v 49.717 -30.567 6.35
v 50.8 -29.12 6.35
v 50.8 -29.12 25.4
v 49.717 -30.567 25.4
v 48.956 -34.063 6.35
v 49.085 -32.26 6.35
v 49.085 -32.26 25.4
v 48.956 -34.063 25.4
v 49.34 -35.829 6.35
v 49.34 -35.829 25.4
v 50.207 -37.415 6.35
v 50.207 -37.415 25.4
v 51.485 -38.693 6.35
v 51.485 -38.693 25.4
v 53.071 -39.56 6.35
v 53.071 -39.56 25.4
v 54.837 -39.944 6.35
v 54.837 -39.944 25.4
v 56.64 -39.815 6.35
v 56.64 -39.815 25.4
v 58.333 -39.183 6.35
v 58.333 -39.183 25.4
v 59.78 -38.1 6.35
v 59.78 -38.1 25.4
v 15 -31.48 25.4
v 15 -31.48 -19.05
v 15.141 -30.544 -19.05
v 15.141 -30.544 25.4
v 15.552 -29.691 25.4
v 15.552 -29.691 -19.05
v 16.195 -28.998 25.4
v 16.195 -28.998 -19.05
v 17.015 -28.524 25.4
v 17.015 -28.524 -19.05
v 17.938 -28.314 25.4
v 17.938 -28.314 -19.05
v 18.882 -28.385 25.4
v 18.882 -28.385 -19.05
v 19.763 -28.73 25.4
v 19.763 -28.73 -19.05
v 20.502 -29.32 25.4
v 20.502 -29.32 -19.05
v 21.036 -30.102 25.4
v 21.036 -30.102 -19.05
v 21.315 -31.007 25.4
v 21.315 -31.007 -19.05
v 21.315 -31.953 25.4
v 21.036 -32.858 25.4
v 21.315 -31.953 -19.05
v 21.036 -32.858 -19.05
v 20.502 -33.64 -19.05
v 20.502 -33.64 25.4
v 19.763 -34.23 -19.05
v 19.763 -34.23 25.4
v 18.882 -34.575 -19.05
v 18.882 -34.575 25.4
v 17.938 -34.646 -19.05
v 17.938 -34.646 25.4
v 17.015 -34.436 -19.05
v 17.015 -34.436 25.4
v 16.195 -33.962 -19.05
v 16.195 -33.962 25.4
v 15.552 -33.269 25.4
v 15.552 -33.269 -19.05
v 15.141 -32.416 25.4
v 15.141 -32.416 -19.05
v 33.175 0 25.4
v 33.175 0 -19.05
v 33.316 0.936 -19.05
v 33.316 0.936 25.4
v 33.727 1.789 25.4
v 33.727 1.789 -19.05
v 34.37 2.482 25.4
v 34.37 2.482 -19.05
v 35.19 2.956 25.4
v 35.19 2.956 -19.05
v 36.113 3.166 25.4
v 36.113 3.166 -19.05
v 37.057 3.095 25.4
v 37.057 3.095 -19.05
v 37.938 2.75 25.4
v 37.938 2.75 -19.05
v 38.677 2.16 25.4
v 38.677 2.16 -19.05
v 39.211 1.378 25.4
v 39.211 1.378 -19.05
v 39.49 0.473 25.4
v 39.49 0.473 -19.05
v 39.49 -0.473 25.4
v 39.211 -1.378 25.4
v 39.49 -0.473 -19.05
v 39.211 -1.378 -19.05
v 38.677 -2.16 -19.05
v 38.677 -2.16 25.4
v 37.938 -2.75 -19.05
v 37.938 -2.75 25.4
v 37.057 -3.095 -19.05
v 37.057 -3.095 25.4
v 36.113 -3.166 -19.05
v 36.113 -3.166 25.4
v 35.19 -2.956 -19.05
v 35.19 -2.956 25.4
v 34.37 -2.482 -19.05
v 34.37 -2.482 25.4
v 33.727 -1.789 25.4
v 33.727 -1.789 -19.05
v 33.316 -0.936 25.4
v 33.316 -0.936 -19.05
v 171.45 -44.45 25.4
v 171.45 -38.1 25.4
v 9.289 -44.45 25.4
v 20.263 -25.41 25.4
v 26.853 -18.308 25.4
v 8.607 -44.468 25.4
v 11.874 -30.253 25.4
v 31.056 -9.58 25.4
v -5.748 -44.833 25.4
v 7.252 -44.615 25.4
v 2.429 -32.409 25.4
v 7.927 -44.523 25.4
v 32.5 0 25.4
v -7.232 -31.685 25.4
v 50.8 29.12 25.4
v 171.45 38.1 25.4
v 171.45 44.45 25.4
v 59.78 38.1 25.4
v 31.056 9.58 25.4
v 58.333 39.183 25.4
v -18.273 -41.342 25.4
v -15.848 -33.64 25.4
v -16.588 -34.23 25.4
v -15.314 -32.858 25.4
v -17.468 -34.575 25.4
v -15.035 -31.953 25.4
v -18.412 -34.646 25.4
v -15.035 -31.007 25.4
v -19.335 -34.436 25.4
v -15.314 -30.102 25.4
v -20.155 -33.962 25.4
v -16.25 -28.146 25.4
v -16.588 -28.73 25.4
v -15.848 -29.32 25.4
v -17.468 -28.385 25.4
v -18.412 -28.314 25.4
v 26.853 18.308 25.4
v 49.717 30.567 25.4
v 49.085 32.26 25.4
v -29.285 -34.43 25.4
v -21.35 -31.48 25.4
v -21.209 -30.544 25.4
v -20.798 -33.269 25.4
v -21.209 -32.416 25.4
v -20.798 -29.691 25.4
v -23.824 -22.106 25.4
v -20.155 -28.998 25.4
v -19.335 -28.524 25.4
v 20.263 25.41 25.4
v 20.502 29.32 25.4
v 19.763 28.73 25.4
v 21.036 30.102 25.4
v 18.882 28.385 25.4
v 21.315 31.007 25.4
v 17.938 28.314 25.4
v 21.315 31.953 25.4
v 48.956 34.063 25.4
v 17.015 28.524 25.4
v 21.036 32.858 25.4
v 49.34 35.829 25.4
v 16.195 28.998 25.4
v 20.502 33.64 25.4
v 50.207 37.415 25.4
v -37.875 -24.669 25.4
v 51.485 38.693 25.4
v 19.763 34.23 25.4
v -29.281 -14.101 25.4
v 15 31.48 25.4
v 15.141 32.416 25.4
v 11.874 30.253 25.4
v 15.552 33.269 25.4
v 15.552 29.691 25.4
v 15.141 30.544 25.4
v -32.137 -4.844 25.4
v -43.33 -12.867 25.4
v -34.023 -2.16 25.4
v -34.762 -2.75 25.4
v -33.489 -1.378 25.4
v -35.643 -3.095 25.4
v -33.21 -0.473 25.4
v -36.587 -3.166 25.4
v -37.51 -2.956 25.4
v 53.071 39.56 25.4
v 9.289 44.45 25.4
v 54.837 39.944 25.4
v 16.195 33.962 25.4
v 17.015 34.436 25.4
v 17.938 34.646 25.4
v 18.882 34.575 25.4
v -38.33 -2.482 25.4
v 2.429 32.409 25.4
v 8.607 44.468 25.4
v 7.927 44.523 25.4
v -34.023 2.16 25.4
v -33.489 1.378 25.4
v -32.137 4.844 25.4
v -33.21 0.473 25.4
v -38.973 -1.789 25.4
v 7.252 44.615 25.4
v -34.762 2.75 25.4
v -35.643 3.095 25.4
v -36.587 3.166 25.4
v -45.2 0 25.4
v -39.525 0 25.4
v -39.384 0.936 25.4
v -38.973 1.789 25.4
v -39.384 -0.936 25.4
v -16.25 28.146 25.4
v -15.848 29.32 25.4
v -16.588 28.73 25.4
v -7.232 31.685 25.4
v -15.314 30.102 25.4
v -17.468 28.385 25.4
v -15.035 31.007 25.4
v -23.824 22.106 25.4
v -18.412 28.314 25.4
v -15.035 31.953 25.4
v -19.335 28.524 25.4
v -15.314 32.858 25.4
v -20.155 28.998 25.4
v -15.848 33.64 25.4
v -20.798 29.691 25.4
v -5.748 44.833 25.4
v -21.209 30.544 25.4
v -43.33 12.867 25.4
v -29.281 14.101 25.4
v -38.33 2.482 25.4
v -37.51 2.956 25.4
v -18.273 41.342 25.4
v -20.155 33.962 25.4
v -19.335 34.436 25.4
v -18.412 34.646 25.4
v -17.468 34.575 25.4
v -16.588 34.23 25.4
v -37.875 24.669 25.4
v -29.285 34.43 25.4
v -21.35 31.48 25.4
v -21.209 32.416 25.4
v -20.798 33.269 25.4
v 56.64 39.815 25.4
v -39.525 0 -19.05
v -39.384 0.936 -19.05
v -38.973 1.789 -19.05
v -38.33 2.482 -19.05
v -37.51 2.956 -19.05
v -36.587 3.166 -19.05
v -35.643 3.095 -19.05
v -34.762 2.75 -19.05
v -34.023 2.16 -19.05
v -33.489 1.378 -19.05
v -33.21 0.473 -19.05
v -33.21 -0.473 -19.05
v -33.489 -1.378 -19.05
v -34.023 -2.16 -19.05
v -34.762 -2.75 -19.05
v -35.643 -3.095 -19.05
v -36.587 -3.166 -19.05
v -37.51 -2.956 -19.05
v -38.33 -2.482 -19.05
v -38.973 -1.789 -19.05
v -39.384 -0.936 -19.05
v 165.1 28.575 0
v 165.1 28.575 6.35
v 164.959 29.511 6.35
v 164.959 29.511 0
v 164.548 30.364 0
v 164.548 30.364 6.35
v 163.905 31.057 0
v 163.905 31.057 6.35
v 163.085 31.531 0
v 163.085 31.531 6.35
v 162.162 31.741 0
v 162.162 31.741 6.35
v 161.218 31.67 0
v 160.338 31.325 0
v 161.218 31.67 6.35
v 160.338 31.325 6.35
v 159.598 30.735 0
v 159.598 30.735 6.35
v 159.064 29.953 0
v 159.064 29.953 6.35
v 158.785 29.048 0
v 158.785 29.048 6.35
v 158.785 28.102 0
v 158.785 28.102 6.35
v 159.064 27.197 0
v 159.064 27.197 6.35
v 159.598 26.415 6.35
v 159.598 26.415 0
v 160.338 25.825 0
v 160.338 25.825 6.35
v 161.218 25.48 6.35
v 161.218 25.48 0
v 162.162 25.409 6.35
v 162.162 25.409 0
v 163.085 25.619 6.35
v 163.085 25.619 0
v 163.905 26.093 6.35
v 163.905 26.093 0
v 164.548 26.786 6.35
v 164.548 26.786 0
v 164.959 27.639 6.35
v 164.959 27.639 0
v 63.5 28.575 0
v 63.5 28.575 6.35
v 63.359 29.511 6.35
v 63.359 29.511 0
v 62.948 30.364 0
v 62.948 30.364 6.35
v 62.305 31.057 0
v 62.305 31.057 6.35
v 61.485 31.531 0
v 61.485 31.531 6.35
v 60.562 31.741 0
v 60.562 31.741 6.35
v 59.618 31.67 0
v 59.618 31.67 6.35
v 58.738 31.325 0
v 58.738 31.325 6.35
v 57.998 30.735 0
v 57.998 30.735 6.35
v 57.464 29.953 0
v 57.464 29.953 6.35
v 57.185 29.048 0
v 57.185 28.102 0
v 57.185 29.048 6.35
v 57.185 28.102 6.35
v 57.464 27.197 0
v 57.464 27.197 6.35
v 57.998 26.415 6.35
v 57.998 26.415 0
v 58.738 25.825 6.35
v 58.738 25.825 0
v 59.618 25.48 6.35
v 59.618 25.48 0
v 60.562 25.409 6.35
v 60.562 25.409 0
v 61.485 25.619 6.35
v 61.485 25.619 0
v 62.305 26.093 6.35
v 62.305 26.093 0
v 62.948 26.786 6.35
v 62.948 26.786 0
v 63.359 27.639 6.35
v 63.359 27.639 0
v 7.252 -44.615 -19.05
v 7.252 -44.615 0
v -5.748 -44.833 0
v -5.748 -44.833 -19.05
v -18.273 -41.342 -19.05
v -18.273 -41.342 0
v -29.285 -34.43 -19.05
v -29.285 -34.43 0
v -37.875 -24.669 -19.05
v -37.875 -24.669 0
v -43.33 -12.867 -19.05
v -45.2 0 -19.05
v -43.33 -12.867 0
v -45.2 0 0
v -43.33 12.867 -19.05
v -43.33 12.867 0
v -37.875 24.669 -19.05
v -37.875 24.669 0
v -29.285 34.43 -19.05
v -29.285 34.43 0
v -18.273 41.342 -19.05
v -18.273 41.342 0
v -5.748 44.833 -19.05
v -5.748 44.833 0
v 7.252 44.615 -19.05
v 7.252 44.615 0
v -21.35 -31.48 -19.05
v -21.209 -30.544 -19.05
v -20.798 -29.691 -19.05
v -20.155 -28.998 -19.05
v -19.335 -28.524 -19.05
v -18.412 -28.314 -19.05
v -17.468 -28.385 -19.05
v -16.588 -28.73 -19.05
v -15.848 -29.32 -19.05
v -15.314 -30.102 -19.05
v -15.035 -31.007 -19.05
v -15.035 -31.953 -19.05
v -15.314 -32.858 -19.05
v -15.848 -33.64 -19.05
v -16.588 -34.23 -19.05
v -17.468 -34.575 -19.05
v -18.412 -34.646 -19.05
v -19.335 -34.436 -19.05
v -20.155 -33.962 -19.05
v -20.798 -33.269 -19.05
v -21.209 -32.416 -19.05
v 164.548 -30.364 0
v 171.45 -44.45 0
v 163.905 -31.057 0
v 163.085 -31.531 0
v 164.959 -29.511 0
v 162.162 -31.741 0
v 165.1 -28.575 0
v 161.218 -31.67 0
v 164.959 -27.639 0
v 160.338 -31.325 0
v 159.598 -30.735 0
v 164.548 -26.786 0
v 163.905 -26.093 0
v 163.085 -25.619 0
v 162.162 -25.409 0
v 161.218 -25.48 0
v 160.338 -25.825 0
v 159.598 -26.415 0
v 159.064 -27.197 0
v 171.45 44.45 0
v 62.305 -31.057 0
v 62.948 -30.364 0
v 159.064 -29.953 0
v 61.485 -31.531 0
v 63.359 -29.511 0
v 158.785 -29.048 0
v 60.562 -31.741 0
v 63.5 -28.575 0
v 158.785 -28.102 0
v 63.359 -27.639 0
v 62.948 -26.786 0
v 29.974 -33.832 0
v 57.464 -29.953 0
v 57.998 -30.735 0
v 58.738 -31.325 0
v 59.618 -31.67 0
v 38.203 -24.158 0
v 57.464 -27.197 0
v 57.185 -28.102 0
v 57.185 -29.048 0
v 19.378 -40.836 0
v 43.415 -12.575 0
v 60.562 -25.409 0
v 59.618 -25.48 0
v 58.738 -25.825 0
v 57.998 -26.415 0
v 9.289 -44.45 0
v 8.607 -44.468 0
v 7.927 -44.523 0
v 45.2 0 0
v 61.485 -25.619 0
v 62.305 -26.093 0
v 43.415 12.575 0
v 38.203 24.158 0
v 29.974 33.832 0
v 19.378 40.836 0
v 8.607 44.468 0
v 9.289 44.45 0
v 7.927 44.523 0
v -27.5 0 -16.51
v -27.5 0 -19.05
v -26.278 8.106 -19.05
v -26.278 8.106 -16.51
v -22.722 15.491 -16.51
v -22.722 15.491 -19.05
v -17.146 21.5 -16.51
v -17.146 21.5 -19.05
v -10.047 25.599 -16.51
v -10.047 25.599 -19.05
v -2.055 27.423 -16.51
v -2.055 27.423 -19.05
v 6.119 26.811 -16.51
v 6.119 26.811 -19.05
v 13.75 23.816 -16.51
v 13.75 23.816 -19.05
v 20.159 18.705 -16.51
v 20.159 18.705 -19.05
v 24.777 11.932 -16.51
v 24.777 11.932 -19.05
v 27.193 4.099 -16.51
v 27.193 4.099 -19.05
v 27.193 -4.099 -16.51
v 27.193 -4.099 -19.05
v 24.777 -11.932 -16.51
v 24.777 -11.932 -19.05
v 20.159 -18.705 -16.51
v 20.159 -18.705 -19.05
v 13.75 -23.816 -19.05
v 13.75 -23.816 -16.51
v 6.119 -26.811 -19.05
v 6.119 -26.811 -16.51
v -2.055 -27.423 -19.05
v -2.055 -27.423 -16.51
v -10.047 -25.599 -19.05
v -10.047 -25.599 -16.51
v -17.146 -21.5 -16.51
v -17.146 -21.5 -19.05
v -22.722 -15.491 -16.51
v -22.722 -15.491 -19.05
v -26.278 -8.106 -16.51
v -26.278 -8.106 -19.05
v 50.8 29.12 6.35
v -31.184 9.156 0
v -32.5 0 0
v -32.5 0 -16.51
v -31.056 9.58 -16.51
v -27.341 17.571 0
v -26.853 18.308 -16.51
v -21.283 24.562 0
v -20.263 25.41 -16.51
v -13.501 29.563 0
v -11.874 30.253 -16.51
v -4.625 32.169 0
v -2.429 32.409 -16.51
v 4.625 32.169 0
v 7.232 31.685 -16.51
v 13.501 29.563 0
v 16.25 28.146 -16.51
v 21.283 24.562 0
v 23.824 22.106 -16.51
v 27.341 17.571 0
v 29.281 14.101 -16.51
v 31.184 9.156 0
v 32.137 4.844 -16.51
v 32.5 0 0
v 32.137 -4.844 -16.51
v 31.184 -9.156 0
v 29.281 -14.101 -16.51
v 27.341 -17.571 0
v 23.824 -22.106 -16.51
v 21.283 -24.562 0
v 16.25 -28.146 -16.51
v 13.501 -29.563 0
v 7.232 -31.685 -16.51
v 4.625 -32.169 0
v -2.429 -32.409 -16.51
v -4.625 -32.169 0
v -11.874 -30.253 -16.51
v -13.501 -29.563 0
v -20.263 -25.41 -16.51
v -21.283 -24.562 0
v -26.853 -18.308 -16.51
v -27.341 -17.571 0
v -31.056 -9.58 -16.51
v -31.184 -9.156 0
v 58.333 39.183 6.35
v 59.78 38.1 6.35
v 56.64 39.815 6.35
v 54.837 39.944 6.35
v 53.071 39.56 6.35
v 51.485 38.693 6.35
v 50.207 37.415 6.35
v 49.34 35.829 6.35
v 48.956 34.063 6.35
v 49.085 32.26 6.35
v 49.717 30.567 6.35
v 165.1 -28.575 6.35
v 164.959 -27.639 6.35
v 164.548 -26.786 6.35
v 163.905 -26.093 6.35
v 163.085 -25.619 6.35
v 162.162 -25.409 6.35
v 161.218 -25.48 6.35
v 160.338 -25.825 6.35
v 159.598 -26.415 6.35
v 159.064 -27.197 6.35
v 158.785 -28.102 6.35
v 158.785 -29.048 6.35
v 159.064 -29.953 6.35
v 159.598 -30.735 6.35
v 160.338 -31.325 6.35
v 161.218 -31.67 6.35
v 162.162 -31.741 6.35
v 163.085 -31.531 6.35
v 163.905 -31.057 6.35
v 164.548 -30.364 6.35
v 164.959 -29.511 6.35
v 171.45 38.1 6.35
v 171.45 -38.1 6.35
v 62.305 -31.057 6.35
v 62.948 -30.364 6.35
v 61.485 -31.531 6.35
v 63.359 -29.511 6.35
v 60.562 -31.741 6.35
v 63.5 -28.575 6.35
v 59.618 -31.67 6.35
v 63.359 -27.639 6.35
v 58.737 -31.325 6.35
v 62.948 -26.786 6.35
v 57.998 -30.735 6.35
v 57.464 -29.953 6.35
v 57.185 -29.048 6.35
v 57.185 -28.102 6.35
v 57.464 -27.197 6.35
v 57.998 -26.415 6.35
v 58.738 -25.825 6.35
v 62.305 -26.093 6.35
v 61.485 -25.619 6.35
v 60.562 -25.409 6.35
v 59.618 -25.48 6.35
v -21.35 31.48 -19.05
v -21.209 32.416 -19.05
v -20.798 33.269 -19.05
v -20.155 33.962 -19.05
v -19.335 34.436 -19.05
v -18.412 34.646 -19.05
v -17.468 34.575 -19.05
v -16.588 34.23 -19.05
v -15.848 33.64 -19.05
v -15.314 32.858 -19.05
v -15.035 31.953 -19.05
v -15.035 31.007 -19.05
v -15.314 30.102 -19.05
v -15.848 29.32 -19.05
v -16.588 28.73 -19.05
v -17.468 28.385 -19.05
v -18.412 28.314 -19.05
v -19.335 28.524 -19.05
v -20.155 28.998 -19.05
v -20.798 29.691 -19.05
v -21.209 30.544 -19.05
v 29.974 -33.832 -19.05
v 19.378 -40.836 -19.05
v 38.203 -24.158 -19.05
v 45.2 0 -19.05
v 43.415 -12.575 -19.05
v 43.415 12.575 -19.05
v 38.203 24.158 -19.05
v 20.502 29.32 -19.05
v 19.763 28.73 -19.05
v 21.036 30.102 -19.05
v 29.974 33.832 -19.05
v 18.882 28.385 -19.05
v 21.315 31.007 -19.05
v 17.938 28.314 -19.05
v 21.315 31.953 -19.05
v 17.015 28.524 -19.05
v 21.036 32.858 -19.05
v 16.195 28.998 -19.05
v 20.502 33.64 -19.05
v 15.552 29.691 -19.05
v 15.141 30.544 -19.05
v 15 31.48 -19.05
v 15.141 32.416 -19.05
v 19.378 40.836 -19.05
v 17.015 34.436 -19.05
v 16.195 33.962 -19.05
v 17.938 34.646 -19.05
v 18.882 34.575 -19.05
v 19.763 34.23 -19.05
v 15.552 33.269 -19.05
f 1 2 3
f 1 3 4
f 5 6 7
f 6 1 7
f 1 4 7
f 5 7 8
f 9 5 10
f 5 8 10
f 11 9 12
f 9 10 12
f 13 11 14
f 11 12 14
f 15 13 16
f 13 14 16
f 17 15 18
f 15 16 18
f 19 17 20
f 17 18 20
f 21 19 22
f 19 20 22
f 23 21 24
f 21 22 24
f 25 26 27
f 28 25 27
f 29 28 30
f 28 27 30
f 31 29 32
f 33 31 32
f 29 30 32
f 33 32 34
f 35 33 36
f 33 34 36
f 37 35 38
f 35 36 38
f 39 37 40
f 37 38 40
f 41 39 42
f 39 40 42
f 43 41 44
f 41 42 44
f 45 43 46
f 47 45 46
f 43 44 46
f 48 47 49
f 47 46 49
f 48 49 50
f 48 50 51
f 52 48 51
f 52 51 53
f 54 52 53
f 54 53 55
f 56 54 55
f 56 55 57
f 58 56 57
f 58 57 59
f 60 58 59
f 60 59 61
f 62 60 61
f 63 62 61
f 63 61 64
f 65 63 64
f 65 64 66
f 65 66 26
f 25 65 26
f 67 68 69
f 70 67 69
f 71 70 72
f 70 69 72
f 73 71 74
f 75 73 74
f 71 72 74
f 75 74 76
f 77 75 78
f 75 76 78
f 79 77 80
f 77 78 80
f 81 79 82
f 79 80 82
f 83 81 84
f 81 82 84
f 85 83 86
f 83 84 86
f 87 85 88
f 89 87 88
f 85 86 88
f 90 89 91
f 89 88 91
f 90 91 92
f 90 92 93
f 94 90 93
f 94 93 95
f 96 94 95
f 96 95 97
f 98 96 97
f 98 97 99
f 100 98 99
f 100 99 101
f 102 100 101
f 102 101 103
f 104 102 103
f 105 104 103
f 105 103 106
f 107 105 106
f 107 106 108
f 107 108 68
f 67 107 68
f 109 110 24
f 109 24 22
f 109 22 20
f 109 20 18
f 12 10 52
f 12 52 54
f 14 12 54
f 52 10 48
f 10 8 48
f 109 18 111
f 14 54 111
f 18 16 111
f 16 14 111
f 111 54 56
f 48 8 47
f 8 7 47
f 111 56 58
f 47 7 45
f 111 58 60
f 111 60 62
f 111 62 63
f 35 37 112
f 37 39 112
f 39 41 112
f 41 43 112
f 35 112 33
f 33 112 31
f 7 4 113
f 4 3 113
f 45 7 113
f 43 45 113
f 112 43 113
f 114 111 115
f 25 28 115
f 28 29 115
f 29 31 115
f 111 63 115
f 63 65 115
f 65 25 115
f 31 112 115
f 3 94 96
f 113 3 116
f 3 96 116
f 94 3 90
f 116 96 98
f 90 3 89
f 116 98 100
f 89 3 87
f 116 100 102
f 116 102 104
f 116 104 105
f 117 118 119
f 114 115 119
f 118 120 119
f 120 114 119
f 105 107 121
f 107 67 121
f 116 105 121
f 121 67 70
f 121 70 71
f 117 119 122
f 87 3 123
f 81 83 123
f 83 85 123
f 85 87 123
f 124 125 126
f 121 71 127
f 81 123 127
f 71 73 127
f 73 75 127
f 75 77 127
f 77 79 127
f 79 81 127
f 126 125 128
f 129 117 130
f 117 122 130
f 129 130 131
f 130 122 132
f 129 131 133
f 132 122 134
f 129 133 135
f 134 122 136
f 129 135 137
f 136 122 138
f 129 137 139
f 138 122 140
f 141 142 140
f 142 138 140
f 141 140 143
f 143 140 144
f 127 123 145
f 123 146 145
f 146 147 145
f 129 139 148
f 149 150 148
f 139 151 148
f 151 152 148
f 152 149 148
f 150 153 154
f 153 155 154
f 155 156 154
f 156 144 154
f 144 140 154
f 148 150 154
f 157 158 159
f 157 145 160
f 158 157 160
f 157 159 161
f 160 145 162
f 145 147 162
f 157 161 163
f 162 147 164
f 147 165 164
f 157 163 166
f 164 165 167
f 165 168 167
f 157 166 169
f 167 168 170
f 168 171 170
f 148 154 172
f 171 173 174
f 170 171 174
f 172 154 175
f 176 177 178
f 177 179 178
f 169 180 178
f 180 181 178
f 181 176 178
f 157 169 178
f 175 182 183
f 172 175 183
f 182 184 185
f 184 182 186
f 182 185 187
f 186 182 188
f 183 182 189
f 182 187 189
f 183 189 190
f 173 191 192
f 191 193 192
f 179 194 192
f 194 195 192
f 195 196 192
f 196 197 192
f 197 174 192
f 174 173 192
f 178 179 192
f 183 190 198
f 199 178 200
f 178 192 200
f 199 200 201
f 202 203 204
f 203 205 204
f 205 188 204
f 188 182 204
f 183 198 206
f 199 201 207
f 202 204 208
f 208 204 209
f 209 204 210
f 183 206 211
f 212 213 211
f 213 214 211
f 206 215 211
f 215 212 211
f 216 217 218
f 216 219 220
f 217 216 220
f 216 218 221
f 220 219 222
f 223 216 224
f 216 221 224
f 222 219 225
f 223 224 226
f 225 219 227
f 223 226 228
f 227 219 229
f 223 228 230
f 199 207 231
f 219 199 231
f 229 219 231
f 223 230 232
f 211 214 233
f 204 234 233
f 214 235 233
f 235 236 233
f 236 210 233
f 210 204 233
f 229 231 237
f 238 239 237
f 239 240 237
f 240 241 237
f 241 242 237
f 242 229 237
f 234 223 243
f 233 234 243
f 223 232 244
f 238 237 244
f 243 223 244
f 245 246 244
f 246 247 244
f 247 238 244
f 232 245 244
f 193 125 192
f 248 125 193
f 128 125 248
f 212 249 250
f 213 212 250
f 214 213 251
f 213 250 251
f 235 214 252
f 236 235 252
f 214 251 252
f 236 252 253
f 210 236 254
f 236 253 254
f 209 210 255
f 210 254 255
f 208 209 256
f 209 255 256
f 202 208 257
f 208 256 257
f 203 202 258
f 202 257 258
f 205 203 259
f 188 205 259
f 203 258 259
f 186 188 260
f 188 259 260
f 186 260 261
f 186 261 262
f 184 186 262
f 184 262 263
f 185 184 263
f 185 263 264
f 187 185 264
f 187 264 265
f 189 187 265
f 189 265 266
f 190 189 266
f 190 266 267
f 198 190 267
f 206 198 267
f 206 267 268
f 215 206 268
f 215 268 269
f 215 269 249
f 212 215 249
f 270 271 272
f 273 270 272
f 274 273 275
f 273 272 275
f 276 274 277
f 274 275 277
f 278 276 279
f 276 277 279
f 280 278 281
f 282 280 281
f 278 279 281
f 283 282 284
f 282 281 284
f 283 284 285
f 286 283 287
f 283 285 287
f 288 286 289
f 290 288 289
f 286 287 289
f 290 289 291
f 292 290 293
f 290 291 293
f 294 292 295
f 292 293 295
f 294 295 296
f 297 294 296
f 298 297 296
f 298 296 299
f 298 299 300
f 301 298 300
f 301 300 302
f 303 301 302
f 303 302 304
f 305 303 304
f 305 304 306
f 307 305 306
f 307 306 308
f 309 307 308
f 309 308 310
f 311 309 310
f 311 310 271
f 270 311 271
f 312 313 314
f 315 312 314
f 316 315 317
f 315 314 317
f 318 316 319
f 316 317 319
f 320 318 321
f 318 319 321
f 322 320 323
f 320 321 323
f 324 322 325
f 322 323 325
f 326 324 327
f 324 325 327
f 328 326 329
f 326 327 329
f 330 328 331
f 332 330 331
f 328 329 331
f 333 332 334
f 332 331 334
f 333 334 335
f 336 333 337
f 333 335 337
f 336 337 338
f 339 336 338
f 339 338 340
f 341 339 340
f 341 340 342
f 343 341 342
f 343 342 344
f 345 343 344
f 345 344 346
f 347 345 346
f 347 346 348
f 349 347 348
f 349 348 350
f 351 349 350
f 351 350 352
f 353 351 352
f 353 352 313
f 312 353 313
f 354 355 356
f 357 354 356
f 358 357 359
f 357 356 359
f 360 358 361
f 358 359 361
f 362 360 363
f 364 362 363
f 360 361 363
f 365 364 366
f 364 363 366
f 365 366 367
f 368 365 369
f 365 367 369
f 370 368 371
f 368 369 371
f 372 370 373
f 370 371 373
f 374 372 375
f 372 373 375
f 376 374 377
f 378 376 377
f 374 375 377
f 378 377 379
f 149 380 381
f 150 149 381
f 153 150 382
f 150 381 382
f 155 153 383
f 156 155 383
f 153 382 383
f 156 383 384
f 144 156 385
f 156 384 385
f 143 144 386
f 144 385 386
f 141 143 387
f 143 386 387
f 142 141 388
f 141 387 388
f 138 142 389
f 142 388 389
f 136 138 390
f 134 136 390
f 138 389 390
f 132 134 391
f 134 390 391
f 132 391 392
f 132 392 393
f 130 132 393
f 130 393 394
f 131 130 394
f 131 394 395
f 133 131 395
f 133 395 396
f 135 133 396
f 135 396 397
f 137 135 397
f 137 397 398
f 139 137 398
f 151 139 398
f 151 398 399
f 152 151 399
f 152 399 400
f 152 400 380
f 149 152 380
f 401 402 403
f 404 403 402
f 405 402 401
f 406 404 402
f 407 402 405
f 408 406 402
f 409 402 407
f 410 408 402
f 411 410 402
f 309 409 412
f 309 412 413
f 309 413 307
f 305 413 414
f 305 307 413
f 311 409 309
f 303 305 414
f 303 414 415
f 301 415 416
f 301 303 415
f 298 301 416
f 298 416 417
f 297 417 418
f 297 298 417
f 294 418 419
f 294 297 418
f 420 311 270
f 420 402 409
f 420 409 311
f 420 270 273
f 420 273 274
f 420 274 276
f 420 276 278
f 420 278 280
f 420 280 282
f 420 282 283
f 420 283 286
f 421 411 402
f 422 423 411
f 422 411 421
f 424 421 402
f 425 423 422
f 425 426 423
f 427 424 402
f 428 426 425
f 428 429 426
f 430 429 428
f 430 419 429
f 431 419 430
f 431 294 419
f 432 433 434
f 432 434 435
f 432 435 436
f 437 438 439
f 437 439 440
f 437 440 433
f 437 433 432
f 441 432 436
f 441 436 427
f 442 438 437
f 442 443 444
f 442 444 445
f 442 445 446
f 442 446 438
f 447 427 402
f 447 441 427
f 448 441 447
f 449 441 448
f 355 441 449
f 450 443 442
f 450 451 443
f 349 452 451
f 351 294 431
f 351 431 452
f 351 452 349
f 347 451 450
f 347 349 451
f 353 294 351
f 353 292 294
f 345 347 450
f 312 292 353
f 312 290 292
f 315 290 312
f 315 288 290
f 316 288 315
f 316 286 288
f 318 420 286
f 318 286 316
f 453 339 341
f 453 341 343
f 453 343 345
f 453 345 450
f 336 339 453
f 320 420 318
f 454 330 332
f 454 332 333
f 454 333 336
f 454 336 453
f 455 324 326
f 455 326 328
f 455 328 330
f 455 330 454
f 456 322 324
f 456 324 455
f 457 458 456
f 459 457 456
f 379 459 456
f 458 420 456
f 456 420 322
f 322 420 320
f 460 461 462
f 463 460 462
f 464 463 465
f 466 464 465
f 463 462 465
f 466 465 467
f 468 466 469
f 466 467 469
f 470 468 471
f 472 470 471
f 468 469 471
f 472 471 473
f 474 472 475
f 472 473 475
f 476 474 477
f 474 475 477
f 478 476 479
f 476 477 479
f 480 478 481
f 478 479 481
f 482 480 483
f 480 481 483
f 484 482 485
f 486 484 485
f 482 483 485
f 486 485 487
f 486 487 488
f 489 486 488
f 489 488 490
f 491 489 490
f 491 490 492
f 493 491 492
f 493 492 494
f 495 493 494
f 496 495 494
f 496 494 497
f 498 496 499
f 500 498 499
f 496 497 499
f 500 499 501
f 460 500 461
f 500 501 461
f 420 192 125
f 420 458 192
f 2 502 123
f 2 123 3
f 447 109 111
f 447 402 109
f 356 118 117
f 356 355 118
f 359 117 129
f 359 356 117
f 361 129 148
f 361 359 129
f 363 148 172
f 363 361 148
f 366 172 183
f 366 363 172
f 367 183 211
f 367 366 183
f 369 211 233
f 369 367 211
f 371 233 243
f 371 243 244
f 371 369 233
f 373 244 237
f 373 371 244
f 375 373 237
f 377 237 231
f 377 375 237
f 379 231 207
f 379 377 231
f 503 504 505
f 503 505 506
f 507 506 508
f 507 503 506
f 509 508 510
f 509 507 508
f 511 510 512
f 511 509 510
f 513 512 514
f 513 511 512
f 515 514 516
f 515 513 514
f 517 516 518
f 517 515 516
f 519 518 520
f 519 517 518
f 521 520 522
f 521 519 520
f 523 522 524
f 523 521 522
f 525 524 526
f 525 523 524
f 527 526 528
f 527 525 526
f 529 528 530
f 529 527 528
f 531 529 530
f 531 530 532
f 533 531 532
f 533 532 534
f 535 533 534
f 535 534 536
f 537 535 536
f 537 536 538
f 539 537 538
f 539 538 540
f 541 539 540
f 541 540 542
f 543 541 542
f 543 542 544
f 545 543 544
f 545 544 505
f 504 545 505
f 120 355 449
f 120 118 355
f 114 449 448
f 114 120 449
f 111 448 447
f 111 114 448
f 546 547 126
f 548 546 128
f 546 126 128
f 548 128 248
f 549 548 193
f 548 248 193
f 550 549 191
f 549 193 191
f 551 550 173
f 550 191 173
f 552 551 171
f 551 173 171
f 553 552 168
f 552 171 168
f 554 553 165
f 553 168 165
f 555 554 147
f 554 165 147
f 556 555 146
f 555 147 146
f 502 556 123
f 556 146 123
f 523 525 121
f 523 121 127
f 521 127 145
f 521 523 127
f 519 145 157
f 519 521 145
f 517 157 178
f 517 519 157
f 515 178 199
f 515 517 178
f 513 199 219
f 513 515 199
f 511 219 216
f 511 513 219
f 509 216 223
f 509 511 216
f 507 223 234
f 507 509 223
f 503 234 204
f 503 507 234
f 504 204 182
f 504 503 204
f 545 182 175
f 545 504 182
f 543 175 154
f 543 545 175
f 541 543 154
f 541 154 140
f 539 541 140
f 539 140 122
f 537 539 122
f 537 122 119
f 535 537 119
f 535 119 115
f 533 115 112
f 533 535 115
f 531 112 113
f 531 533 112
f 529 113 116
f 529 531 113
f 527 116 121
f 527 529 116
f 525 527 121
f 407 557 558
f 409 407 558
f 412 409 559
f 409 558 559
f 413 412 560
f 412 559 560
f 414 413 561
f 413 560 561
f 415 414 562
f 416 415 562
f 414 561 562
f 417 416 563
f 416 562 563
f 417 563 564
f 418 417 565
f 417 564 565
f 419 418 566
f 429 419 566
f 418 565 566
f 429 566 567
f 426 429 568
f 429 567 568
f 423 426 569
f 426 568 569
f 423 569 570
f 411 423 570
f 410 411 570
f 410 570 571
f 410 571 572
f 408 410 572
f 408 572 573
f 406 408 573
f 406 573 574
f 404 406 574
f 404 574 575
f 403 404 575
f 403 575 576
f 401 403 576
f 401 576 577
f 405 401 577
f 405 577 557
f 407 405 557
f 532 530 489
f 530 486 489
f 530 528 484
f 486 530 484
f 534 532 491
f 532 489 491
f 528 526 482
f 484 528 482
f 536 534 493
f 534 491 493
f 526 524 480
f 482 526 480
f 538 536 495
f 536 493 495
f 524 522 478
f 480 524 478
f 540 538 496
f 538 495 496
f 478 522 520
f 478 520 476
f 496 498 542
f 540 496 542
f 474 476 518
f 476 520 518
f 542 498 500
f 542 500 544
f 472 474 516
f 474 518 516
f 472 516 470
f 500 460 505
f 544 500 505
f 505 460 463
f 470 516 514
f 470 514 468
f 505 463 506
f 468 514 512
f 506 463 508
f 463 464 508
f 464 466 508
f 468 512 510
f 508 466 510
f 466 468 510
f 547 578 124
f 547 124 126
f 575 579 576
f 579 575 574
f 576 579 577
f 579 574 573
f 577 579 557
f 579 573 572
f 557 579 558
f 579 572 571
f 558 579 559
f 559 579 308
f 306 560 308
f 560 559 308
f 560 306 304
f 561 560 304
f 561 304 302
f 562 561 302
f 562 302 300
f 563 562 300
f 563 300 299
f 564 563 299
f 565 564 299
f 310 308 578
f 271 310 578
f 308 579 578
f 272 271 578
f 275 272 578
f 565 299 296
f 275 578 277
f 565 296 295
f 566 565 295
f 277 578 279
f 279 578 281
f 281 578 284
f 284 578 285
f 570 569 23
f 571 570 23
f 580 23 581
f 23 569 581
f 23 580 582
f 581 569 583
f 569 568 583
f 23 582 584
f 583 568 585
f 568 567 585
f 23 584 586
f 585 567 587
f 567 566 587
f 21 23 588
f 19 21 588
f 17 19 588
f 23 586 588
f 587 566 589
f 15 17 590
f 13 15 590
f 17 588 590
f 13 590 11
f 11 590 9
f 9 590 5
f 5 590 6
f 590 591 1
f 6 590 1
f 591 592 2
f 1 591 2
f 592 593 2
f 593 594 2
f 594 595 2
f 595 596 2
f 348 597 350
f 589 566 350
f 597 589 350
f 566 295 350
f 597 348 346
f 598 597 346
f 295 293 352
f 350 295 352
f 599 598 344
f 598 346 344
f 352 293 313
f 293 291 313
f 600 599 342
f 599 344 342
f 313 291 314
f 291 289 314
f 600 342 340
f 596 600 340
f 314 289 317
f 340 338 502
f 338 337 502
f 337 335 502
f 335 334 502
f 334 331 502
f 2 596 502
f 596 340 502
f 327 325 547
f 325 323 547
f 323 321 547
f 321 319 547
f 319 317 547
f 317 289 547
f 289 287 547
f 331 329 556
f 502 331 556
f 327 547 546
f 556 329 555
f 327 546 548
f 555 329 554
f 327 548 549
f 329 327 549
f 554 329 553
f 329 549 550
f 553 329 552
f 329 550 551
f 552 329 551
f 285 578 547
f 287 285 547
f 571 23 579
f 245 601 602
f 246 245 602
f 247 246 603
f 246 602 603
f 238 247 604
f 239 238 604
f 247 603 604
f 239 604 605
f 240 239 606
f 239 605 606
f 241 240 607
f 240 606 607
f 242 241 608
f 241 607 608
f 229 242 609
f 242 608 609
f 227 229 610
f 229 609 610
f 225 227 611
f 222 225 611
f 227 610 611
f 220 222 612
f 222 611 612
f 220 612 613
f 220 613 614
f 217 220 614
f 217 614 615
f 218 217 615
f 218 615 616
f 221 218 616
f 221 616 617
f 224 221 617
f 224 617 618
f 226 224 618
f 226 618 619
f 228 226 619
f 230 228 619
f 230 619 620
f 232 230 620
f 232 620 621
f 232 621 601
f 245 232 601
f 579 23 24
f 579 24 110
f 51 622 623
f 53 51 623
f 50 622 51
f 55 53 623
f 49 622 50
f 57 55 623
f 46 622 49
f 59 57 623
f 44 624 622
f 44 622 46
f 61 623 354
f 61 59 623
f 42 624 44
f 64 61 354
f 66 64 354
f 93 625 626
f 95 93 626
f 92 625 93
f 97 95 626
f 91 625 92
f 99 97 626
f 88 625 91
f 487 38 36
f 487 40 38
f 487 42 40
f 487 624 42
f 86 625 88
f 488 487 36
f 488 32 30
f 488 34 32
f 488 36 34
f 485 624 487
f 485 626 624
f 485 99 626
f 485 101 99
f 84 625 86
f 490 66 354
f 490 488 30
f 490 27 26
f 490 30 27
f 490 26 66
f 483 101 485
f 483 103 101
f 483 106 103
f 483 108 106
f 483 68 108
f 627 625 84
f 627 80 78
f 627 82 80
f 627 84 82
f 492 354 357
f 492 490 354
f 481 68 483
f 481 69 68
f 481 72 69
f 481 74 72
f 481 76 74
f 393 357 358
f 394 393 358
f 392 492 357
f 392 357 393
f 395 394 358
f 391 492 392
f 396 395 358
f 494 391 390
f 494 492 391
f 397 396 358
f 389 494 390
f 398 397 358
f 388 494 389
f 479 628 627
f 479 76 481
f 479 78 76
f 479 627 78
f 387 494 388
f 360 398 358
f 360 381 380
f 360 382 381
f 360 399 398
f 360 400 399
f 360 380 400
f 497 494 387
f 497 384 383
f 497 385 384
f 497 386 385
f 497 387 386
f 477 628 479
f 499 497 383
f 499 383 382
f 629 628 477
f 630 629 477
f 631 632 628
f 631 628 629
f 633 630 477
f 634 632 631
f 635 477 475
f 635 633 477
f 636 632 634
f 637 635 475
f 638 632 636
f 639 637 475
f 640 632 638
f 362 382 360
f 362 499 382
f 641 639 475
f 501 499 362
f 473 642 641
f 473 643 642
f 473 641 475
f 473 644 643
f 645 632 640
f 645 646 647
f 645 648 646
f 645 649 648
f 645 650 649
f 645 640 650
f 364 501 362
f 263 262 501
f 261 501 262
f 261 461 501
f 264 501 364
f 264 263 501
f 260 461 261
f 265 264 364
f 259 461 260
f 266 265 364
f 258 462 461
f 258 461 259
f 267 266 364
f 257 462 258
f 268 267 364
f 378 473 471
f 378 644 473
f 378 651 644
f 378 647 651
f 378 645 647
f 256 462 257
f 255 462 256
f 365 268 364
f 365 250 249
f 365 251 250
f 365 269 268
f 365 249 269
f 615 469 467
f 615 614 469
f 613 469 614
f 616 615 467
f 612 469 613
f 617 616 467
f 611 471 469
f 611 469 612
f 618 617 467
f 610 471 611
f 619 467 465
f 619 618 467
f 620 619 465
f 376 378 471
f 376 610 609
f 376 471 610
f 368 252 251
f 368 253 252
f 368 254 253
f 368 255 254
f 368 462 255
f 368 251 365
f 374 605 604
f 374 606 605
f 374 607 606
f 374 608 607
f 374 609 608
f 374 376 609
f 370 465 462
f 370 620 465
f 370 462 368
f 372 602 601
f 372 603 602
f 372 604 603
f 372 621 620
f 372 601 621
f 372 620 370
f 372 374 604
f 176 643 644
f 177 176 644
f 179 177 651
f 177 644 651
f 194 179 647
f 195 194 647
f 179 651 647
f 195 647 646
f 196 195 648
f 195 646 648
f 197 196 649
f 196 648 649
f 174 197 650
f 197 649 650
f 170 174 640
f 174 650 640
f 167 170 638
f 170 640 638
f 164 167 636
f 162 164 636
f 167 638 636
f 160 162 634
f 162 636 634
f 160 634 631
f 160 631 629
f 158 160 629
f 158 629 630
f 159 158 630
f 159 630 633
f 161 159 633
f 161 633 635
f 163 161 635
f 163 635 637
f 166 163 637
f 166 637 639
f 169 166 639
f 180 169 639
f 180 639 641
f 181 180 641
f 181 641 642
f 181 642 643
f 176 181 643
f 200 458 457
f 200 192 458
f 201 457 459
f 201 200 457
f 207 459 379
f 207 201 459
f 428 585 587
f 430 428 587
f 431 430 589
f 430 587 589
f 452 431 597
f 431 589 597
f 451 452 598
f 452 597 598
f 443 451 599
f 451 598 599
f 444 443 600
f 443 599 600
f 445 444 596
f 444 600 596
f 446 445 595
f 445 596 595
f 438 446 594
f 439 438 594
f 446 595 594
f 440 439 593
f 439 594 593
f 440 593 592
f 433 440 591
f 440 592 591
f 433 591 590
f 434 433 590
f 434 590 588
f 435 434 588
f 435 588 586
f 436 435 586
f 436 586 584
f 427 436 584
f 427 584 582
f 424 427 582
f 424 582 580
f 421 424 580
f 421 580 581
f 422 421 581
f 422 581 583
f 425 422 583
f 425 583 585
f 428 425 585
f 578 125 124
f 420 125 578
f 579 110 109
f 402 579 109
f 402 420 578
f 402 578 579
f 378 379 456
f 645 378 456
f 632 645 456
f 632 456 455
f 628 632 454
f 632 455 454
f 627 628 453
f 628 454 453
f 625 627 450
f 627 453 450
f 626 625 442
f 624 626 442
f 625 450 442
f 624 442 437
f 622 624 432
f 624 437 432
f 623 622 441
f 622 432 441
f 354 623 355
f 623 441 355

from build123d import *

# Parameters (mm, degrees)
SKETCH1_R               = 32.5
SKETCH1_W               = 120.65
SKETCH1_H               = 76.2
BOSS_EXTRUDE2_DEPTH     = 6.35
BOSS_EXTRUDE3_START     = 6.35
SKETCH1_3_R             = 32.5
BOSS_EXTRUDE3_DEPTH     = 19.05
SKETCH2_R               = 3.175
CUT_EXTRUDE1_DEPTH      = 20.05
CUT_EXTRUDE1_DEPTH_BACK = 7.35
SKETCH3_R               = 6.35
CUT_EXTRUDE2_DEPTH      = 19.05
FILLET1_R               = 12.7
SKETCH5_R               = 32.5
BOSS_EXTRUDE6_DEPTH     = 19.05
SKETCH6_R               = 32.5
SKETCH6_R_2             = 27.5
BOSS_EXTRUDE7_DEPTH     = 2.54
SKETCH9_R               = 3.175
CUT_EXTRUDE3_DEPTH      = 1
CUT_EXTRUDE3_DEPTH_BACK = 45.45


with BuildPart() as part:
    # Sketch1 → Boss-Extrude2 (new body)
    with BuildSketch(Plane.XY):
        with BuildLine():
            Line((8.199848, 44.45), (171.45, 44.45))
            Line((171.45, 44.45), (171.45, 38.1))
            Line((171.45, 38.1), (50.8, 38.1))
            Line((50.8, 38.1), (50.8, -38.1))
            Line((50.8, -38.1), (171.45, -38.1))
            Line((171.45, -38.1), (171.45, -44.45))
            Line((171.45, -44.45), (8.199848, -44.45))
            ThreePointArc((8.199848, -44.45), (-45.2, 0), (8.199848, 44.45))
        make_face()
        Circle(SKETCH1_R, mode=Mode.SUBTRACT)
        with Locations((111.125, 0)):
            Rectangle(SKETCH1_W, SKETCH1_H)
    extrude(amount=BOSS_EXTRUDE2_DEPTH)

    # Sketch1<3> → Boss-Extrude3 (add)
    with BuildSketch(Plane.XY.offset(BOSS_EXTRUDE3_START)):
        with BuildLine():
            Line((8.199848, 44.45), (171.45, 44.45))
            Line((171.45, 44.45), (171.45, 38.1))
            Line((171.45, 38.1), (50.8, 38.1))
            Line((50.8, 38.1), (50.8, -38.1))
            Line((50.8, -38.1), (171.45, -38.1))
            Line((171.45, -38.1), (171.45, -44.45))
            Line((171.45, -44.45), (8.199848, -44.45))
            ThreePointArc((8.199848, -44.45), (-45.2, 0), (8.199848, 44.45))
        make_face()
        Circle(SKETCH1_3_R, mode=Mode.SUBTRACT)
    extrude(amount=BOSS_EXTRUDE3_DEPTH)

    # Sketch2 → Cut-Extrude1 (cut, two sides)
    with BuildSketch(Plane.XY.offset(6.35)) as cut_extrude1_sk:
        with Locations((60.325, 28.575)):
            Circle(SKETCH2_R)
        with Locations((161.925, 28.575)):
            Circle(SKETCH2_R)
        with Locations((161.925, -28.575)):
            Circle(SKETCH2_R)
        with Locations((60.325, -28.575)):
            Circle(SKETCH2_R)
    extrude(amount=CUT_EXTRUDE1_DEPTH, mode=Mode.SUBTRACT)
    extrude(cut_extrude1_sk.sketch, amount=-CUT_EXTRUDE1_DEPTH_BACK, mode=Mode.SUBTRACT)

    # Sketch3 → Cut-Extrude2 (cut)
    with BuildSketch(Plane.XY.offset(25.4)):
        with Locations((55.290128, 33.609872)):
            Circle(SKETCH3_R)
        with Locations((55.290128, -33.609872)):
            Circle(SKETCH3_R)
    extrude(amount=-CUT_EXTRUDE2_DEPTH, mode=Mode.SUBTRACT)

    # Fillet1
    fillet1_edges = [part.edges().sort_by_distance(p)[0] for p in [
        (8.199848, -44.45, 12.7),
        (8.199848, 44.45, 12.7),
    ]]
    fillet(fillet1_edges, radius=FILLET1_R)

    # Sketch5 → Boss-Extrude6 (add)
    with BuildSketch(Plane(origin=(0, 0, 0), x_dir=(-1, 0, 0), z_dir=(0, 0, -1))):
        with BuildLine():
            ThreePointArc((-7.2516, -44.614508), (45.2, 0), (-7.2516, 44.614508))
            ThreePointArc((-7.2516, 44.614508), (-45.2, 0), (-7.2516, -44.614508))
        make_face()
        Circle(SKETCH5_R, mode=Mode.SUBTRACT)
    extrude(amount=BOSS_EXTRUDE6_DEPTH)

    # Sketch6 → Boss-Extrude7 (add)
    with BuildSketch(Plane(origin=(0, 0, -19.05), x_dir=(-1, 0, 0), z_dir=(0, 0, -1))):
        Circle(SKETCH6_R)
        Circle(SKETCH6_R_2, mode=Mode.SUBTRACT)
    extrude(amount=-BOSS_EXTRUDE7_DEPTH)

    # Sketch9 → Cut-Extrude3 (cut, two sides)
    with BuildSketch(Plane(origin=(0, 0, -19.05), x_dir=(-1, 0, 0), z_dir=(0, 0, -1))) as cut_extrude3_sk:
        with Locations((36.35, 0)):
            Circle(SKETCH9_R)
        with Locations((18.175, -31.480023)):
            Circle(SKETCH9_R)
        with Locations((-18.175, -31.480023)):
            Circle(SKETCH9_R)
        with Locations((-36.35, 0)):
            Circle(SKETCH9_R)
        with Locations((-18.175, 31.480023)):
            Circle(SKETCH9_R)
        with Locations((18.175, 31.480023)):
            Circle(SKETCH9_R)
    extrude(amount=CUT_EXTRUDE3_DEPTH, mode=Mode.SUBTRACT)
    extrude(cut_extrude3_sk.sketch, amount=-CUT_EXTRUDE3_DEPTH_BACK, mode=Mode.SUBTRACT)


solid = part.part
